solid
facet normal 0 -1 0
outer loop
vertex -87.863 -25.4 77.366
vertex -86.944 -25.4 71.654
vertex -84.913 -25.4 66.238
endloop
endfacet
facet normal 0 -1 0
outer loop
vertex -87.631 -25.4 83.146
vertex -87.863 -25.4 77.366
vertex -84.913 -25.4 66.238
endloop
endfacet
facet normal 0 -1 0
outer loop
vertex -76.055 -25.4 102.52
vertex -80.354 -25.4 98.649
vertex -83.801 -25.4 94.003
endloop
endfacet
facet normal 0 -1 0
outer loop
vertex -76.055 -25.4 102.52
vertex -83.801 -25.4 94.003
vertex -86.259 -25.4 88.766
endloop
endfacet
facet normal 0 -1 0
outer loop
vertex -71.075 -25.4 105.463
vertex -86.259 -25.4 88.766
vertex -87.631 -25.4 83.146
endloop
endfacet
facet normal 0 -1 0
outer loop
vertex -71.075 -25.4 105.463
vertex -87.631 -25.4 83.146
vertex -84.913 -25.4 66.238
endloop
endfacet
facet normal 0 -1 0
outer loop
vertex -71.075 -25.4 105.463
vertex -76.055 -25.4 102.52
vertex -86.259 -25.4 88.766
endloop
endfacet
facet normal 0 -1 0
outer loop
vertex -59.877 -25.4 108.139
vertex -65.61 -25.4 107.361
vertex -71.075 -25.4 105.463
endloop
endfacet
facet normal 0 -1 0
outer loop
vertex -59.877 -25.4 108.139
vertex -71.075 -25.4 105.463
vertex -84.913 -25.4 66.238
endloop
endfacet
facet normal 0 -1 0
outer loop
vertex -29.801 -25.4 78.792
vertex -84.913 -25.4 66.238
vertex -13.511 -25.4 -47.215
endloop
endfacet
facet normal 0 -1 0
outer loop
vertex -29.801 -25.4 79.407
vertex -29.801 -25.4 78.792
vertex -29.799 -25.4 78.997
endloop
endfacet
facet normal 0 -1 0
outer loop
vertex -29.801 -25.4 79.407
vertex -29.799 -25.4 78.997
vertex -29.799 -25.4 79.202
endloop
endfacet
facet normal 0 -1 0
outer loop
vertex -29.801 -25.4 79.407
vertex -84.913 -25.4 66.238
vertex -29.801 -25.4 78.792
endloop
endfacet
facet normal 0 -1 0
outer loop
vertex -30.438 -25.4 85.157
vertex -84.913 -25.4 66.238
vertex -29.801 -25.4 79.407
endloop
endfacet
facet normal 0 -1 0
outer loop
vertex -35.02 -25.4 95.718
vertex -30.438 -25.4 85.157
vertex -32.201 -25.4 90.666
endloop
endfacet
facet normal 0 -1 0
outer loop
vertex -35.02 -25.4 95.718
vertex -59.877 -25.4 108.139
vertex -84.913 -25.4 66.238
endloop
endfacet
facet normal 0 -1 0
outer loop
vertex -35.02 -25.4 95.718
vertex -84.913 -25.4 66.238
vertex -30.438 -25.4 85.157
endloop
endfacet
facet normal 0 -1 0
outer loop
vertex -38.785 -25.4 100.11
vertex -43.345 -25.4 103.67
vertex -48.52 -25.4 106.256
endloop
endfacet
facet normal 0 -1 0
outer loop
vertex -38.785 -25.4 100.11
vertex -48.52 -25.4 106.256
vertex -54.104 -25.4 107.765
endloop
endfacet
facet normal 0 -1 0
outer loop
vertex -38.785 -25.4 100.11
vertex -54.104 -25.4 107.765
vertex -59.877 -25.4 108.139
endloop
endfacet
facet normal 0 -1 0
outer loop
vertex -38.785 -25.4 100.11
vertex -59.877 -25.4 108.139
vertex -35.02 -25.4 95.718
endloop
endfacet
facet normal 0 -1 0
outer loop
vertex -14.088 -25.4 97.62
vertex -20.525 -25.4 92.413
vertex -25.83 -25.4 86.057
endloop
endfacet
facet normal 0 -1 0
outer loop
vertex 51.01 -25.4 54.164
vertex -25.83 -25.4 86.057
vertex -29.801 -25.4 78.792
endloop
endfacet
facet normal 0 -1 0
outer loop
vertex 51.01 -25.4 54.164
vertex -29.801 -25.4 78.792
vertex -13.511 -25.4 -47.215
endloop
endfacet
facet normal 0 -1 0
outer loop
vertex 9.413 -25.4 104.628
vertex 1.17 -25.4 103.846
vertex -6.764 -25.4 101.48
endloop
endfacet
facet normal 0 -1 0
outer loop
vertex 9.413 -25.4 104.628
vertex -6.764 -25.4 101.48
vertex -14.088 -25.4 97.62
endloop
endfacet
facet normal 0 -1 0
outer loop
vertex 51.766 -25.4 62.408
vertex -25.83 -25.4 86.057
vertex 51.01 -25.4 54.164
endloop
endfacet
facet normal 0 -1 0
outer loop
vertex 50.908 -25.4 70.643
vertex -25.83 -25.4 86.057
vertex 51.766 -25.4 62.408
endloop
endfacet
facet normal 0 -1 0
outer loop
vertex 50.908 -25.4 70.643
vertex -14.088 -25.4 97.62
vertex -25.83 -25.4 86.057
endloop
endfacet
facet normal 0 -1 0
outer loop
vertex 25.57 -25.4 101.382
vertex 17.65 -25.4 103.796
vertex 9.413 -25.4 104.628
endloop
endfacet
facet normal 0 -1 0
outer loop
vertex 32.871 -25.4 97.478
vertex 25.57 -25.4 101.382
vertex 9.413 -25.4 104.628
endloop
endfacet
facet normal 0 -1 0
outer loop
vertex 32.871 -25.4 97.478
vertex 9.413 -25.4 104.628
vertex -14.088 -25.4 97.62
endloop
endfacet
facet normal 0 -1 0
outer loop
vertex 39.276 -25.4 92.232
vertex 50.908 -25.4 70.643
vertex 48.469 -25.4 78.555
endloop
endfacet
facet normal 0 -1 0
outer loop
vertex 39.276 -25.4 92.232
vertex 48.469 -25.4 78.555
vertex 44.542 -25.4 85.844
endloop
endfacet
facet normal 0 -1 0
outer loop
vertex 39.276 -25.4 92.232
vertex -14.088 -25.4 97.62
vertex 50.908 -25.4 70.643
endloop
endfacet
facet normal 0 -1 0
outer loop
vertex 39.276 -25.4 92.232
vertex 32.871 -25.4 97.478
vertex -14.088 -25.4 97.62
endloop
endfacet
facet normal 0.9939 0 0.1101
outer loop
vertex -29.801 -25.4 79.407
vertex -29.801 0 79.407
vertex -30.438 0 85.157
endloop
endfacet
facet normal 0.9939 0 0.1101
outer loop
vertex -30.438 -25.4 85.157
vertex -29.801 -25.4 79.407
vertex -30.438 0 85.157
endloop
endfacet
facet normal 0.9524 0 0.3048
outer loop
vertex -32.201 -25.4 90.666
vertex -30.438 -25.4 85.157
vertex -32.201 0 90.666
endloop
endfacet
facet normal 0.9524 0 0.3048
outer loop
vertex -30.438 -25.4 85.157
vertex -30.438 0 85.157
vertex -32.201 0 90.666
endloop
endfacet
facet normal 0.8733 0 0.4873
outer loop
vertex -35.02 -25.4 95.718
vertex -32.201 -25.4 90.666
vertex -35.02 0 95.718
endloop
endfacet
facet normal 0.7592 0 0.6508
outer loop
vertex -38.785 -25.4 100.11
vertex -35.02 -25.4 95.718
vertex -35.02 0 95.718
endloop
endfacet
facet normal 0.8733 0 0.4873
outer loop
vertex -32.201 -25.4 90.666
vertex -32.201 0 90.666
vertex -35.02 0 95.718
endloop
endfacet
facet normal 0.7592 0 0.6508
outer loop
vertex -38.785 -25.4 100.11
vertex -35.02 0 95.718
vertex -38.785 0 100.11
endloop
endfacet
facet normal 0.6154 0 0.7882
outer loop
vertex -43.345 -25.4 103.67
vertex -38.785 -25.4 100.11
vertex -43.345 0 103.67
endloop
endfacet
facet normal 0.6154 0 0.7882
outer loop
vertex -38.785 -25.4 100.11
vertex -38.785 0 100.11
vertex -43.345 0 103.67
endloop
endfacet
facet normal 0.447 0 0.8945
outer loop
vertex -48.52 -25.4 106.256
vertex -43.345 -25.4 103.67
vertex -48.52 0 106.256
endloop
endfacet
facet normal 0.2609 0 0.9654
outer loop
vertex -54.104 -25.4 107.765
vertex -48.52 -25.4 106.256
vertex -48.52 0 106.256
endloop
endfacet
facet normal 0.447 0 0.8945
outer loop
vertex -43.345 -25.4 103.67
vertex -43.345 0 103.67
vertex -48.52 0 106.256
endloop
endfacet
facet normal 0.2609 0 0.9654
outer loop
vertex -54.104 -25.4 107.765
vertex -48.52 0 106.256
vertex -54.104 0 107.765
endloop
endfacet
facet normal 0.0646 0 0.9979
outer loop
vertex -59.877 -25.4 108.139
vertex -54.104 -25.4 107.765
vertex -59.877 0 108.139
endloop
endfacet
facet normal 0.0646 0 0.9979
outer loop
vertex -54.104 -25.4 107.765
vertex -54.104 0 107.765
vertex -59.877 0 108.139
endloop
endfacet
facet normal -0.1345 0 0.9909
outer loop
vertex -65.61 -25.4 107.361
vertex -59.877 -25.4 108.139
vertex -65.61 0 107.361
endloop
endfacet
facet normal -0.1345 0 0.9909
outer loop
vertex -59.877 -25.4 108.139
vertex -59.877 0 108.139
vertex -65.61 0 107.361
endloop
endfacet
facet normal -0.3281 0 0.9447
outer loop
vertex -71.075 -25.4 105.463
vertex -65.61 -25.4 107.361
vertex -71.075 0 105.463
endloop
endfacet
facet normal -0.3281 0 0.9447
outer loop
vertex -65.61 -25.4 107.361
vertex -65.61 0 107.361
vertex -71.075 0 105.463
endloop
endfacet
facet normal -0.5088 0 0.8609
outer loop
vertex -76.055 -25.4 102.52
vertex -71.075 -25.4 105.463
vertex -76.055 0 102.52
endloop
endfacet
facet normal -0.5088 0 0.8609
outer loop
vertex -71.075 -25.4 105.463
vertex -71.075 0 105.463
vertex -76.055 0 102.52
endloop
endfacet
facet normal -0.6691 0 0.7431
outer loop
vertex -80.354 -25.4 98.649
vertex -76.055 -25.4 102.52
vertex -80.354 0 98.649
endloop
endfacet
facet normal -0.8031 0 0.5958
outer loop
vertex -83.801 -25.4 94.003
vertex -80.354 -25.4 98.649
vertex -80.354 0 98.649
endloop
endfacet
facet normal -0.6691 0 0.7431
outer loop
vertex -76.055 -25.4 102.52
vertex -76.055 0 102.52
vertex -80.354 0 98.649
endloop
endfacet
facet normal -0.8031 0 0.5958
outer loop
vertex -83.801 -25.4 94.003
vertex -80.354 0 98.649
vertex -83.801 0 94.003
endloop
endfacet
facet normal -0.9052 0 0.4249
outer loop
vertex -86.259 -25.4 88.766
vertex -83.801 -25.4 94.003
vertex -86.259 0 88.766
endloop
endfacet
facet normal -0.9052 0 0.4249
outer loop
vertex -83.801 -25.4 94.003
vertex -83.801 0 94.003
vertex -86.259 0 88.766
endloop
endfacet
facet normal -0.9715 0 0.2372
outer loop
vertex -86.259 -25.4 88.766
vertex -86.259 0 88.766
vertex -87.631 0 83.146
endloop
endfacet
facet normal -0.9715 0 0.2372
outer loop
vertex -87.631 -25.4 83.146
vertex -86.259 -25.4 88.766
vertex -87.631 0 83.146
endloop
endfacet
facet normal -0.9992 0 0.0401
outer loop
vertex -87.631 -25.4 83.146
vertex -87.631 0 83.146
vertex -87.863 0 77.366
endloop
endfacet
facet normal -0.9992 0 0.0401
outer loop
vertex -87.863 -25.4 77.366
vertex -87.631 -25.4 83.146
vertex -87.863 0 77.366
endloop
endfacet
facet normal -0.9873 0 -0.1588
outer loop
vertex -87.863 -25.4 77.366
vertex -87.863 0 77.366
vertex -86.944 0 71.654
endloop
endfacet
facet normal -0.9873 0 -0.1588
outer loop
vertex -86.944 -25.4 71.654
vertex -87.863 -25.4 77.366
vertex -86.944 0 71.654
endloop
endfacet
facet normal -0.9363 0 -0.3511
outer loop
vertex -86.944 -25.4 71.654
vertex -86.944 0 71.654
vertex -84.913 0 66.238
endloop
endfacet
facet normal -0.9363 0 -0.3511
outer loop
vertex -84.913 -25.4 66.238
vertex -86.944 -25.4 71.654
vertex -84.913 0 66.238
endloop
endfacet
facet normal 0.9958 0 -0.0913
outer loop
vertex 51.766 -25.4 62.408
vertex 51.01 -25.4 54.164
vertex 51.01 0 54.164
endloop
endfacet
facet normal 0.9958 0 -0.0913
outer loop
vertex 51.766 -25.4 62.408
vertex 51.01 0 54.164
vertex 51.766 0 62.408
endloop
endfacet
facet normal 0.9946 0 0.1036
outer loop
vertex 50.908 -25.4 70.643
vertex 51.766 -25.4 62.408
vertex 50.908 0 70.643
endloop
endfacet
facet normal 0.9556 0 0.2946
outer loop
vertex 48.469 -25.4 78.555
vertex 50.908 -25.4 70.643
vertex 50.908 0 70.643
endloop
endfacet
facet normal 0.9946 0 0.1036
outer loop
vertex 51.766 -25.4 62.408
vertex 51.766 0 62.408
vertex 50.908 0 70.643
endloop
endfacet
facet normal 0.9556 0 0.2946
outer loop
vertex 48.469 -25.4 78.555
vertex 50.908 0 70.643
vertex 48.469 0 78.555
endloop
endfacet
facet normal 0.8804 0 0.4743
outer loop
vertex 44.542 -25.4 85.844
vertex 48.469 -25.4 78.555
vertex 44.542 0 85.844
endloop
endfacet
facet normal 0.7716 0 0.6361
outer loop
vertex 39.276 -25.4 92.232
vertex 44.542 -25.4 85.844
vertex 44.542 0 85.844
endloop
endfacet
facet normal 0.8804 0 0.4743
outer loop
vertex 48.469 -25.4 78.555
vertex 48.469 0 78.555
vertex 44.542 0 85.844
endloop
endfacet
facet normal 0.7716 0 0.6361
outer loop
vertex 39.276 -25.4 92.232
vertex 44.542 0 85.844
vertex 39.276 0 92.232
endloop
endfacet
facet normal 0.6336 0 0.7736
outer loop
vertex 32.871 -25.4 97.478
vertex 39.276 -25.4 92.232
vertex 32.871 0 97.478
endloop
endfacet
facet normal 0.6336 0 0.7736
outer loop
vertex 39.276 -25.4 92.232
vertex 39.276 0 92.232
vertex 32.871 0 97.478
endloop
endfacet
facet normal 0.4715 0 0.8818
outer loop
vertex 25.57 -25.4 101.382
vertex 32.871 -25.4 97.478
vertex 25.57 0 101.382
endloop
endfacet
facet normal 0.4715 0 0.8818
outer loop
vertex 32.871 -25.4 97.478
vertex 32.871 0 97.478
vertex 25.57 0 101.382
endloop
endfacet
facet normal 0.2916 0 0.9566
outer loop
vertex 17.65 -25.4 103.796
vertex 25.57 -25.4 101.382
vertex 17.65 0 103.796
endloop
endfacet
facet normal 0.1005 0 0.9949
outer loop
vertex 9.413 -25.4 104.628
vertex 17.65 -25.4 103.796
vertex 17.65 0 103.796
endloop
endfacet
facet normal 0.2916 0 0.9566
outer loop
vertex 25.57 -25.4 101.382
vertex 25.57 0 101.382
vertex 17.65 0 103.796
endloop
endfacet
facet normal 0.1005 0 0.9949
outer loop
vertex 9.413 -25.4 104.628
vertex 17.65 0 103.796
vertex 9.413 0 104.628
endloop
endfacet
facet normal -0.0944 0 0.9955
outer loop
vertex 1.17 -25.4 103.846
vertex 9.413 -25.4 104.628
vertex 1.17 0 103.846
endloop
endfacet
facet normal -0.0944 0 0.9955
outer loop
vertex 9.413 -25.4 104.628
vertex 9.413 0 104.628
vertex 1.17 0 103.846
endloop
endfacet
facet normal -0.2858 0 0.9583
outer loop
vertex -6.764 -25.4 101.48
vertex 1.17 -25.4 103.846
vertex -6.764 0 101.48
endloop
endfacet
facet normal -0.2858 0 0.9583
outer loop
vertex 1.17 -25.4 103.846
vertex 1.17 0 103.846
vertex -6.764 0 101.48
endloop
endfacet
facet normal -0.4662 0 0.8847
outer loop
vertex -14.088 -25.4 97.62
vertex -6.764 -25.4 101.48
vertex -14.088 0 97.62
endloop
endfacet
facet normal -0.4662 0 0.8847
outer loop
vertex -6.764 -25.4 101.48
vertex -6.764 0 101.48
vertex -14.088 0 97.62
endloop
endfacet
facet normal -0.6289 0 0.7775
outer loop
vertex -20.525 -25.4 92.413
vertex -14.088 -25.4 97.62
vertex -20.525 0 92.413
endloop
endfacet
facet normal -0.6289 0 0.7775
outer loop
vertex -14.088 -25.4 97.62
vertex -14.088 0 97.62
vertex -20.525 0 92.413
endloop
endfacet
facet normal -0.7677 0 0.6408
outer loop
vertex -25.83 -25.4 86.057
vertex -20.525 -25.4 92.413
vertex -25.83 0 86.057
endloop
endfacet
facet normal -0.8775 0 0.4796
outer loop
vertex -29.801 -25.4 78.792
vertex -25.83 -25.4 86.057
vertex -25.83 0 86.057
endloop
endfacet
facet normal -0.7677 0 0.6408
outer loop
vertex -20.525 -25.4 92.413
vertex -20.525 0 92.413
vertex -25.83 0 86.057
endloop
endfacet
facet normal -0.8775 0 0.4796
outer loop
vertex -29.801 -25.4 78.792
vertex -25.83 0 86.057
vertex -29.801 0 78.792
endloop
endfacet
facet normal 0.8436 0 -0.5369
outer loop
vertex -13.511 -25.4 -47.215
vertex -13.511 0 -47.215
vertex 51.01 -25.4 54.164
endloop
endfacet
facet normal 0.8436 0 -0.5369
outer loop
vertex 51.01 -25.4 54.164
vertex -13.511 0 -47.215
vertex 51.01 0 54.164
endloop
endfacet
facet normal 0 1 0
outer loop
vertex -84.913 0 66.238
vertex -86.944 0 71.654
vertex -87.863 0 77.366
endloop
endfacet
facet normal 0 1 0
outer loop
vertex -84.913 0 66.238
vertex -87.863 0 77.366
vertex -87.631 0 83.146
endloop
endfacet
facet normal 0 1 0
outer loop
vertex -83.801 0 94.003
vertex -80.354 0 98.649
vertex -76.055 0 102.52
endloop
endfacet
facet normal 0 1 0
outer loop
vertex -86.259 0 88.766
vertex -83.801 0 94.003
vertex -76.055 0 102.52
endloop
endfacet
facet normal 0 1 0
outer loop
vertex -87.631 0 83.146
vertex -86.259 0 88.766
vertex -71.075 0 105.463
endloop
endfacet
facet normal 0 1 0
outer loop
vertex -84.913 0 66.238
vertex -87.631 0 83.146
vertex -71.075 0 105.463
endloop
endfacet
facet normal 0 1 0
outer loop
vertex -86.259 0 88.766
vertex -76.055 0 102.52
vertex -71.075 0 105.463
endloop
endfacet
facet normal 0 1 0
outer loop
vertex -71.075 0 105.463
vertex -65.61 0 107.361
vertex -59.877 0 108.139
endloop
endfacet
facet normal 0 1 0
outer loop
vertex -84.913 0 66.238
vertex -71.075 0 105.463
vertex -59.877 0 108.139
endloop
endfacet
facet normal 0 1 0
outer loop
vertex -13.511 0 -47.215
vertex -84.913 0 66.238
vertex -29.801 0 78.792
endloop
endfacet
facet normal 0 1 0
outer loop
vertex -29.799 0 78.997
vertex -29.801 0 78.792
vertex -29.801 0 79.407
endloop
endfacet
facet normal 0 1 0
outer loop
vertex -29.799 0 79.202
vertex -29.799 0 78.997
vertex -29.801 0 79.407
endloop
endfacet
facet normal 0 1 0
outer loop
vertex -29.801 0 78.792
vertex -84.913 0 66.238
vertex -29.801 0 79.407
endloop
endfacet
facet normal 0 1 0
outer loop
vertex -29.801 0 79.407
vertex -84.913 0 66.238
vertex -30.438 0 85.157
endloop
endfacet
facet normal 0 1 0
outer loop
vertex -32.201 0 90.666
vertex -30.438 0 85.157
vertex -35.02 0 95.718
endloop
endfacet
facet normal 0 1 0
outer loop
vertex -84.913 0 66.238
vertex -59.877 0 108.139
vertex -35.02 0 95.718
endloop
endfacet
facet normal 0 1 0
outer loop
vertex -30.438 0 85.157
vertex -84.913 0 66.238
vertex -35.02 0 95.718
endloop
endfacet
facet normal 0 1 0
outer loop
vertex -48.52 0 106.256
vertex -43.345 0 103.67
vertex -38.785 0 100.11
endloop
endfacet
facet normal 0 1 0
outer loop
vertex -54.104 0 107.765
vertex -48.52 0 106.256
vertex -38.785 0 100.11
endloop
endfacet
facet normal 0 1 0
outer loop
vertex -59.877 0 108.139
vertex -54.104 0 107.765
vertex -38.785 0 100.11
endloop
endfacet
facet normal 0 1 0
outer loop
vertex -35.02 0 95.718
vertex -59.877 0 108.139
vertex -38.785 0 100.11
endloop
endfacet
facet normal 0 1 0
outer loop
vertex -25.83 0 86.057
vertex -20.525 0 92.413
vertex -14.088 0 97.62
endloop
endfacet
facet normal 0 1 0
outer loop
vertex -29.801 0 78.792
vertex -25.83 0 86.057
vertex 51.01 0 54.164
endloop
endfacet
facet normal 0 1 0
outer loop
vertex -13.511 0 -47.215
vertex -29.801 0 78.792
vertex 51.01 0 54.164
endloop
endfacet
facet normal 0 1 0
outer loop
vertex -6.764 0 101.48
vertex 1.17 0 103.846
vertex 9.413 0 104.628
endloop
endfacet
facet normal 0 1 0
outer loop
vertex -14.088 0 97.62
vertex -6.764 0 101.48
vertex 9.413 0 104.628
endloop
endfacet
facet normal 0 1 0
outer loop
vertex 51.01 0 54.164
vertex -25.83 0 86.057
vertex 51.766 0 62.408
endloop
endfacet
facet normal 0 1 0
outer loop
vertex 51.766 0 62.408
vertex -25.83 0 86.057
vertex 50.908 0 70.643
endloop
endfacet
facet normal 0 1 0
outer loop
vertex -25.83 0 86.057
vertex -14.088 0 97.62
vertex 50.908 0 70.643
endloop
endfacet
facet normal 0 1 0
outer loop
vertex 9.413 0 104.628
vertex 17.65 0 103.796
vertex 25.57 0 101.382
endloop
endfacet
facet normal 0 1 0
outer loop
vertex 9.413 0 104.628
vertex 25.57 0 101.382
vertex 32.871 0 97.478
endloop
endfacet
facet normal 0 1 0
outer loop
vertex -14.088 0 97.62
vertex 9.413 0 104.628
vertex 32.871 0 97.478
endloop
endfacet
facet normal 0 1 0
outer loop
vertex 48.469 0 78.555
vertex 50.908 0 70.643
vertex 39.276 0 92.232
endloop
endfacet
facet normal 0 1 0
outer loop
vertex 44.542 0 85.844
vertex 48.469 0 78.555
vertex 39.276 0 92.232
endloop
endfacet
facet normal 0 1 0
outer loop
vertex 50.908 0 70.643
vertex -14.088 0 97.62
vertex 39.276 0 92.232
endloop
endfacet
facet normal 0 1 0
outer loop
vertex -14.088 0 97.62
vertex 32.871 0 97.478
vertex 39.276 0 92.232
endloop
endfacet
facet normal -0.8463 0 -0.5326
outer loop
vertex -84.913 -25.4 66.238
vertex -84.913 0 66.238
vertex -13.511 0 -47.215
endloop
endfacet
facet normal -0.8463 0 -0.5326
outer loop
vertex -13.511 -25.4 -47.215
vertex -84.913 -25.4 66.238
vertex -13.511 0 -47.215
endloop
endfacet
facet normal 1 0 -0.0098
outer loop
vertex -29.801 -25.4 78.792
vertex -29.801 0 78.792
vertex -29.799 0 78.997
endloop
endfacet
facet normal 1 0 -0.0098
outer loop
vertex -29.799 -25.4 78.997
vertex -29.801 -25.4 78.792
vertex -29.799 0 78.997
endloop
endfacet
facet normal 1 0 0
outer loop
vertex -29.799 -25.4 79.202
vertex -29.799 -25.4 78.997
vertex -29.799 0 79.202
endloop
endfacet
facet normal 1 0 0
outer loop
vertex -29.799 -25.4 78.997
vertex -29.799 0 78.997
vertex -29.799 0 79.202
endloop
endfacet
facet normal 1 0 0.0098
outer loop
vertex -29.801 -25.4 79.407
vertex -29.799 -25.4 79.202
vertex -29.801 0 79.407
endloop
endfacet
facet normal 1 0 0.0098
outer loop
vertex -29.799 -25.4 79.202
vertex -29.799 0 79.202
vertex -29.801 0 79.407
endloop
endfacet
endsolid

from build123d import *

# Parameters (mm, degrees)
F1_DEPTH = 25.4


with BuildPart() as f1:
    # F0 (on Front) → F1 (new body)
    with BuildSketch(Plane.XZ):
        with BuildLine():
            ThreePointArc((51.010095, 54.163594), (21.668951, 102.782431), (-29.800825, 78.791678))
            Line((-29.800825, 78.791678), (-29.800825, 79.406742))
            ThreePointArc((-29.800825, 79.406742), (-65.60986, 107.361105), (-84.912881, 66.237792))
            Line((-84.912881, 66.237792), (-13.511168, -47.215126))
            Line((-13.511168, -47.215126), (51.010095, 54.163594))
        make_face()
        with BuildLine():
            Line((-29.800825, 79.406742), (-29.800825, 78.791678))
            ThreePointArc((-29.800825, 78.791678), (-29.799197, 79.09921), (-29.800825, 79.406742))
        make_face()
    extrude(amount=F1_DEPTH)


solid = f1.part
